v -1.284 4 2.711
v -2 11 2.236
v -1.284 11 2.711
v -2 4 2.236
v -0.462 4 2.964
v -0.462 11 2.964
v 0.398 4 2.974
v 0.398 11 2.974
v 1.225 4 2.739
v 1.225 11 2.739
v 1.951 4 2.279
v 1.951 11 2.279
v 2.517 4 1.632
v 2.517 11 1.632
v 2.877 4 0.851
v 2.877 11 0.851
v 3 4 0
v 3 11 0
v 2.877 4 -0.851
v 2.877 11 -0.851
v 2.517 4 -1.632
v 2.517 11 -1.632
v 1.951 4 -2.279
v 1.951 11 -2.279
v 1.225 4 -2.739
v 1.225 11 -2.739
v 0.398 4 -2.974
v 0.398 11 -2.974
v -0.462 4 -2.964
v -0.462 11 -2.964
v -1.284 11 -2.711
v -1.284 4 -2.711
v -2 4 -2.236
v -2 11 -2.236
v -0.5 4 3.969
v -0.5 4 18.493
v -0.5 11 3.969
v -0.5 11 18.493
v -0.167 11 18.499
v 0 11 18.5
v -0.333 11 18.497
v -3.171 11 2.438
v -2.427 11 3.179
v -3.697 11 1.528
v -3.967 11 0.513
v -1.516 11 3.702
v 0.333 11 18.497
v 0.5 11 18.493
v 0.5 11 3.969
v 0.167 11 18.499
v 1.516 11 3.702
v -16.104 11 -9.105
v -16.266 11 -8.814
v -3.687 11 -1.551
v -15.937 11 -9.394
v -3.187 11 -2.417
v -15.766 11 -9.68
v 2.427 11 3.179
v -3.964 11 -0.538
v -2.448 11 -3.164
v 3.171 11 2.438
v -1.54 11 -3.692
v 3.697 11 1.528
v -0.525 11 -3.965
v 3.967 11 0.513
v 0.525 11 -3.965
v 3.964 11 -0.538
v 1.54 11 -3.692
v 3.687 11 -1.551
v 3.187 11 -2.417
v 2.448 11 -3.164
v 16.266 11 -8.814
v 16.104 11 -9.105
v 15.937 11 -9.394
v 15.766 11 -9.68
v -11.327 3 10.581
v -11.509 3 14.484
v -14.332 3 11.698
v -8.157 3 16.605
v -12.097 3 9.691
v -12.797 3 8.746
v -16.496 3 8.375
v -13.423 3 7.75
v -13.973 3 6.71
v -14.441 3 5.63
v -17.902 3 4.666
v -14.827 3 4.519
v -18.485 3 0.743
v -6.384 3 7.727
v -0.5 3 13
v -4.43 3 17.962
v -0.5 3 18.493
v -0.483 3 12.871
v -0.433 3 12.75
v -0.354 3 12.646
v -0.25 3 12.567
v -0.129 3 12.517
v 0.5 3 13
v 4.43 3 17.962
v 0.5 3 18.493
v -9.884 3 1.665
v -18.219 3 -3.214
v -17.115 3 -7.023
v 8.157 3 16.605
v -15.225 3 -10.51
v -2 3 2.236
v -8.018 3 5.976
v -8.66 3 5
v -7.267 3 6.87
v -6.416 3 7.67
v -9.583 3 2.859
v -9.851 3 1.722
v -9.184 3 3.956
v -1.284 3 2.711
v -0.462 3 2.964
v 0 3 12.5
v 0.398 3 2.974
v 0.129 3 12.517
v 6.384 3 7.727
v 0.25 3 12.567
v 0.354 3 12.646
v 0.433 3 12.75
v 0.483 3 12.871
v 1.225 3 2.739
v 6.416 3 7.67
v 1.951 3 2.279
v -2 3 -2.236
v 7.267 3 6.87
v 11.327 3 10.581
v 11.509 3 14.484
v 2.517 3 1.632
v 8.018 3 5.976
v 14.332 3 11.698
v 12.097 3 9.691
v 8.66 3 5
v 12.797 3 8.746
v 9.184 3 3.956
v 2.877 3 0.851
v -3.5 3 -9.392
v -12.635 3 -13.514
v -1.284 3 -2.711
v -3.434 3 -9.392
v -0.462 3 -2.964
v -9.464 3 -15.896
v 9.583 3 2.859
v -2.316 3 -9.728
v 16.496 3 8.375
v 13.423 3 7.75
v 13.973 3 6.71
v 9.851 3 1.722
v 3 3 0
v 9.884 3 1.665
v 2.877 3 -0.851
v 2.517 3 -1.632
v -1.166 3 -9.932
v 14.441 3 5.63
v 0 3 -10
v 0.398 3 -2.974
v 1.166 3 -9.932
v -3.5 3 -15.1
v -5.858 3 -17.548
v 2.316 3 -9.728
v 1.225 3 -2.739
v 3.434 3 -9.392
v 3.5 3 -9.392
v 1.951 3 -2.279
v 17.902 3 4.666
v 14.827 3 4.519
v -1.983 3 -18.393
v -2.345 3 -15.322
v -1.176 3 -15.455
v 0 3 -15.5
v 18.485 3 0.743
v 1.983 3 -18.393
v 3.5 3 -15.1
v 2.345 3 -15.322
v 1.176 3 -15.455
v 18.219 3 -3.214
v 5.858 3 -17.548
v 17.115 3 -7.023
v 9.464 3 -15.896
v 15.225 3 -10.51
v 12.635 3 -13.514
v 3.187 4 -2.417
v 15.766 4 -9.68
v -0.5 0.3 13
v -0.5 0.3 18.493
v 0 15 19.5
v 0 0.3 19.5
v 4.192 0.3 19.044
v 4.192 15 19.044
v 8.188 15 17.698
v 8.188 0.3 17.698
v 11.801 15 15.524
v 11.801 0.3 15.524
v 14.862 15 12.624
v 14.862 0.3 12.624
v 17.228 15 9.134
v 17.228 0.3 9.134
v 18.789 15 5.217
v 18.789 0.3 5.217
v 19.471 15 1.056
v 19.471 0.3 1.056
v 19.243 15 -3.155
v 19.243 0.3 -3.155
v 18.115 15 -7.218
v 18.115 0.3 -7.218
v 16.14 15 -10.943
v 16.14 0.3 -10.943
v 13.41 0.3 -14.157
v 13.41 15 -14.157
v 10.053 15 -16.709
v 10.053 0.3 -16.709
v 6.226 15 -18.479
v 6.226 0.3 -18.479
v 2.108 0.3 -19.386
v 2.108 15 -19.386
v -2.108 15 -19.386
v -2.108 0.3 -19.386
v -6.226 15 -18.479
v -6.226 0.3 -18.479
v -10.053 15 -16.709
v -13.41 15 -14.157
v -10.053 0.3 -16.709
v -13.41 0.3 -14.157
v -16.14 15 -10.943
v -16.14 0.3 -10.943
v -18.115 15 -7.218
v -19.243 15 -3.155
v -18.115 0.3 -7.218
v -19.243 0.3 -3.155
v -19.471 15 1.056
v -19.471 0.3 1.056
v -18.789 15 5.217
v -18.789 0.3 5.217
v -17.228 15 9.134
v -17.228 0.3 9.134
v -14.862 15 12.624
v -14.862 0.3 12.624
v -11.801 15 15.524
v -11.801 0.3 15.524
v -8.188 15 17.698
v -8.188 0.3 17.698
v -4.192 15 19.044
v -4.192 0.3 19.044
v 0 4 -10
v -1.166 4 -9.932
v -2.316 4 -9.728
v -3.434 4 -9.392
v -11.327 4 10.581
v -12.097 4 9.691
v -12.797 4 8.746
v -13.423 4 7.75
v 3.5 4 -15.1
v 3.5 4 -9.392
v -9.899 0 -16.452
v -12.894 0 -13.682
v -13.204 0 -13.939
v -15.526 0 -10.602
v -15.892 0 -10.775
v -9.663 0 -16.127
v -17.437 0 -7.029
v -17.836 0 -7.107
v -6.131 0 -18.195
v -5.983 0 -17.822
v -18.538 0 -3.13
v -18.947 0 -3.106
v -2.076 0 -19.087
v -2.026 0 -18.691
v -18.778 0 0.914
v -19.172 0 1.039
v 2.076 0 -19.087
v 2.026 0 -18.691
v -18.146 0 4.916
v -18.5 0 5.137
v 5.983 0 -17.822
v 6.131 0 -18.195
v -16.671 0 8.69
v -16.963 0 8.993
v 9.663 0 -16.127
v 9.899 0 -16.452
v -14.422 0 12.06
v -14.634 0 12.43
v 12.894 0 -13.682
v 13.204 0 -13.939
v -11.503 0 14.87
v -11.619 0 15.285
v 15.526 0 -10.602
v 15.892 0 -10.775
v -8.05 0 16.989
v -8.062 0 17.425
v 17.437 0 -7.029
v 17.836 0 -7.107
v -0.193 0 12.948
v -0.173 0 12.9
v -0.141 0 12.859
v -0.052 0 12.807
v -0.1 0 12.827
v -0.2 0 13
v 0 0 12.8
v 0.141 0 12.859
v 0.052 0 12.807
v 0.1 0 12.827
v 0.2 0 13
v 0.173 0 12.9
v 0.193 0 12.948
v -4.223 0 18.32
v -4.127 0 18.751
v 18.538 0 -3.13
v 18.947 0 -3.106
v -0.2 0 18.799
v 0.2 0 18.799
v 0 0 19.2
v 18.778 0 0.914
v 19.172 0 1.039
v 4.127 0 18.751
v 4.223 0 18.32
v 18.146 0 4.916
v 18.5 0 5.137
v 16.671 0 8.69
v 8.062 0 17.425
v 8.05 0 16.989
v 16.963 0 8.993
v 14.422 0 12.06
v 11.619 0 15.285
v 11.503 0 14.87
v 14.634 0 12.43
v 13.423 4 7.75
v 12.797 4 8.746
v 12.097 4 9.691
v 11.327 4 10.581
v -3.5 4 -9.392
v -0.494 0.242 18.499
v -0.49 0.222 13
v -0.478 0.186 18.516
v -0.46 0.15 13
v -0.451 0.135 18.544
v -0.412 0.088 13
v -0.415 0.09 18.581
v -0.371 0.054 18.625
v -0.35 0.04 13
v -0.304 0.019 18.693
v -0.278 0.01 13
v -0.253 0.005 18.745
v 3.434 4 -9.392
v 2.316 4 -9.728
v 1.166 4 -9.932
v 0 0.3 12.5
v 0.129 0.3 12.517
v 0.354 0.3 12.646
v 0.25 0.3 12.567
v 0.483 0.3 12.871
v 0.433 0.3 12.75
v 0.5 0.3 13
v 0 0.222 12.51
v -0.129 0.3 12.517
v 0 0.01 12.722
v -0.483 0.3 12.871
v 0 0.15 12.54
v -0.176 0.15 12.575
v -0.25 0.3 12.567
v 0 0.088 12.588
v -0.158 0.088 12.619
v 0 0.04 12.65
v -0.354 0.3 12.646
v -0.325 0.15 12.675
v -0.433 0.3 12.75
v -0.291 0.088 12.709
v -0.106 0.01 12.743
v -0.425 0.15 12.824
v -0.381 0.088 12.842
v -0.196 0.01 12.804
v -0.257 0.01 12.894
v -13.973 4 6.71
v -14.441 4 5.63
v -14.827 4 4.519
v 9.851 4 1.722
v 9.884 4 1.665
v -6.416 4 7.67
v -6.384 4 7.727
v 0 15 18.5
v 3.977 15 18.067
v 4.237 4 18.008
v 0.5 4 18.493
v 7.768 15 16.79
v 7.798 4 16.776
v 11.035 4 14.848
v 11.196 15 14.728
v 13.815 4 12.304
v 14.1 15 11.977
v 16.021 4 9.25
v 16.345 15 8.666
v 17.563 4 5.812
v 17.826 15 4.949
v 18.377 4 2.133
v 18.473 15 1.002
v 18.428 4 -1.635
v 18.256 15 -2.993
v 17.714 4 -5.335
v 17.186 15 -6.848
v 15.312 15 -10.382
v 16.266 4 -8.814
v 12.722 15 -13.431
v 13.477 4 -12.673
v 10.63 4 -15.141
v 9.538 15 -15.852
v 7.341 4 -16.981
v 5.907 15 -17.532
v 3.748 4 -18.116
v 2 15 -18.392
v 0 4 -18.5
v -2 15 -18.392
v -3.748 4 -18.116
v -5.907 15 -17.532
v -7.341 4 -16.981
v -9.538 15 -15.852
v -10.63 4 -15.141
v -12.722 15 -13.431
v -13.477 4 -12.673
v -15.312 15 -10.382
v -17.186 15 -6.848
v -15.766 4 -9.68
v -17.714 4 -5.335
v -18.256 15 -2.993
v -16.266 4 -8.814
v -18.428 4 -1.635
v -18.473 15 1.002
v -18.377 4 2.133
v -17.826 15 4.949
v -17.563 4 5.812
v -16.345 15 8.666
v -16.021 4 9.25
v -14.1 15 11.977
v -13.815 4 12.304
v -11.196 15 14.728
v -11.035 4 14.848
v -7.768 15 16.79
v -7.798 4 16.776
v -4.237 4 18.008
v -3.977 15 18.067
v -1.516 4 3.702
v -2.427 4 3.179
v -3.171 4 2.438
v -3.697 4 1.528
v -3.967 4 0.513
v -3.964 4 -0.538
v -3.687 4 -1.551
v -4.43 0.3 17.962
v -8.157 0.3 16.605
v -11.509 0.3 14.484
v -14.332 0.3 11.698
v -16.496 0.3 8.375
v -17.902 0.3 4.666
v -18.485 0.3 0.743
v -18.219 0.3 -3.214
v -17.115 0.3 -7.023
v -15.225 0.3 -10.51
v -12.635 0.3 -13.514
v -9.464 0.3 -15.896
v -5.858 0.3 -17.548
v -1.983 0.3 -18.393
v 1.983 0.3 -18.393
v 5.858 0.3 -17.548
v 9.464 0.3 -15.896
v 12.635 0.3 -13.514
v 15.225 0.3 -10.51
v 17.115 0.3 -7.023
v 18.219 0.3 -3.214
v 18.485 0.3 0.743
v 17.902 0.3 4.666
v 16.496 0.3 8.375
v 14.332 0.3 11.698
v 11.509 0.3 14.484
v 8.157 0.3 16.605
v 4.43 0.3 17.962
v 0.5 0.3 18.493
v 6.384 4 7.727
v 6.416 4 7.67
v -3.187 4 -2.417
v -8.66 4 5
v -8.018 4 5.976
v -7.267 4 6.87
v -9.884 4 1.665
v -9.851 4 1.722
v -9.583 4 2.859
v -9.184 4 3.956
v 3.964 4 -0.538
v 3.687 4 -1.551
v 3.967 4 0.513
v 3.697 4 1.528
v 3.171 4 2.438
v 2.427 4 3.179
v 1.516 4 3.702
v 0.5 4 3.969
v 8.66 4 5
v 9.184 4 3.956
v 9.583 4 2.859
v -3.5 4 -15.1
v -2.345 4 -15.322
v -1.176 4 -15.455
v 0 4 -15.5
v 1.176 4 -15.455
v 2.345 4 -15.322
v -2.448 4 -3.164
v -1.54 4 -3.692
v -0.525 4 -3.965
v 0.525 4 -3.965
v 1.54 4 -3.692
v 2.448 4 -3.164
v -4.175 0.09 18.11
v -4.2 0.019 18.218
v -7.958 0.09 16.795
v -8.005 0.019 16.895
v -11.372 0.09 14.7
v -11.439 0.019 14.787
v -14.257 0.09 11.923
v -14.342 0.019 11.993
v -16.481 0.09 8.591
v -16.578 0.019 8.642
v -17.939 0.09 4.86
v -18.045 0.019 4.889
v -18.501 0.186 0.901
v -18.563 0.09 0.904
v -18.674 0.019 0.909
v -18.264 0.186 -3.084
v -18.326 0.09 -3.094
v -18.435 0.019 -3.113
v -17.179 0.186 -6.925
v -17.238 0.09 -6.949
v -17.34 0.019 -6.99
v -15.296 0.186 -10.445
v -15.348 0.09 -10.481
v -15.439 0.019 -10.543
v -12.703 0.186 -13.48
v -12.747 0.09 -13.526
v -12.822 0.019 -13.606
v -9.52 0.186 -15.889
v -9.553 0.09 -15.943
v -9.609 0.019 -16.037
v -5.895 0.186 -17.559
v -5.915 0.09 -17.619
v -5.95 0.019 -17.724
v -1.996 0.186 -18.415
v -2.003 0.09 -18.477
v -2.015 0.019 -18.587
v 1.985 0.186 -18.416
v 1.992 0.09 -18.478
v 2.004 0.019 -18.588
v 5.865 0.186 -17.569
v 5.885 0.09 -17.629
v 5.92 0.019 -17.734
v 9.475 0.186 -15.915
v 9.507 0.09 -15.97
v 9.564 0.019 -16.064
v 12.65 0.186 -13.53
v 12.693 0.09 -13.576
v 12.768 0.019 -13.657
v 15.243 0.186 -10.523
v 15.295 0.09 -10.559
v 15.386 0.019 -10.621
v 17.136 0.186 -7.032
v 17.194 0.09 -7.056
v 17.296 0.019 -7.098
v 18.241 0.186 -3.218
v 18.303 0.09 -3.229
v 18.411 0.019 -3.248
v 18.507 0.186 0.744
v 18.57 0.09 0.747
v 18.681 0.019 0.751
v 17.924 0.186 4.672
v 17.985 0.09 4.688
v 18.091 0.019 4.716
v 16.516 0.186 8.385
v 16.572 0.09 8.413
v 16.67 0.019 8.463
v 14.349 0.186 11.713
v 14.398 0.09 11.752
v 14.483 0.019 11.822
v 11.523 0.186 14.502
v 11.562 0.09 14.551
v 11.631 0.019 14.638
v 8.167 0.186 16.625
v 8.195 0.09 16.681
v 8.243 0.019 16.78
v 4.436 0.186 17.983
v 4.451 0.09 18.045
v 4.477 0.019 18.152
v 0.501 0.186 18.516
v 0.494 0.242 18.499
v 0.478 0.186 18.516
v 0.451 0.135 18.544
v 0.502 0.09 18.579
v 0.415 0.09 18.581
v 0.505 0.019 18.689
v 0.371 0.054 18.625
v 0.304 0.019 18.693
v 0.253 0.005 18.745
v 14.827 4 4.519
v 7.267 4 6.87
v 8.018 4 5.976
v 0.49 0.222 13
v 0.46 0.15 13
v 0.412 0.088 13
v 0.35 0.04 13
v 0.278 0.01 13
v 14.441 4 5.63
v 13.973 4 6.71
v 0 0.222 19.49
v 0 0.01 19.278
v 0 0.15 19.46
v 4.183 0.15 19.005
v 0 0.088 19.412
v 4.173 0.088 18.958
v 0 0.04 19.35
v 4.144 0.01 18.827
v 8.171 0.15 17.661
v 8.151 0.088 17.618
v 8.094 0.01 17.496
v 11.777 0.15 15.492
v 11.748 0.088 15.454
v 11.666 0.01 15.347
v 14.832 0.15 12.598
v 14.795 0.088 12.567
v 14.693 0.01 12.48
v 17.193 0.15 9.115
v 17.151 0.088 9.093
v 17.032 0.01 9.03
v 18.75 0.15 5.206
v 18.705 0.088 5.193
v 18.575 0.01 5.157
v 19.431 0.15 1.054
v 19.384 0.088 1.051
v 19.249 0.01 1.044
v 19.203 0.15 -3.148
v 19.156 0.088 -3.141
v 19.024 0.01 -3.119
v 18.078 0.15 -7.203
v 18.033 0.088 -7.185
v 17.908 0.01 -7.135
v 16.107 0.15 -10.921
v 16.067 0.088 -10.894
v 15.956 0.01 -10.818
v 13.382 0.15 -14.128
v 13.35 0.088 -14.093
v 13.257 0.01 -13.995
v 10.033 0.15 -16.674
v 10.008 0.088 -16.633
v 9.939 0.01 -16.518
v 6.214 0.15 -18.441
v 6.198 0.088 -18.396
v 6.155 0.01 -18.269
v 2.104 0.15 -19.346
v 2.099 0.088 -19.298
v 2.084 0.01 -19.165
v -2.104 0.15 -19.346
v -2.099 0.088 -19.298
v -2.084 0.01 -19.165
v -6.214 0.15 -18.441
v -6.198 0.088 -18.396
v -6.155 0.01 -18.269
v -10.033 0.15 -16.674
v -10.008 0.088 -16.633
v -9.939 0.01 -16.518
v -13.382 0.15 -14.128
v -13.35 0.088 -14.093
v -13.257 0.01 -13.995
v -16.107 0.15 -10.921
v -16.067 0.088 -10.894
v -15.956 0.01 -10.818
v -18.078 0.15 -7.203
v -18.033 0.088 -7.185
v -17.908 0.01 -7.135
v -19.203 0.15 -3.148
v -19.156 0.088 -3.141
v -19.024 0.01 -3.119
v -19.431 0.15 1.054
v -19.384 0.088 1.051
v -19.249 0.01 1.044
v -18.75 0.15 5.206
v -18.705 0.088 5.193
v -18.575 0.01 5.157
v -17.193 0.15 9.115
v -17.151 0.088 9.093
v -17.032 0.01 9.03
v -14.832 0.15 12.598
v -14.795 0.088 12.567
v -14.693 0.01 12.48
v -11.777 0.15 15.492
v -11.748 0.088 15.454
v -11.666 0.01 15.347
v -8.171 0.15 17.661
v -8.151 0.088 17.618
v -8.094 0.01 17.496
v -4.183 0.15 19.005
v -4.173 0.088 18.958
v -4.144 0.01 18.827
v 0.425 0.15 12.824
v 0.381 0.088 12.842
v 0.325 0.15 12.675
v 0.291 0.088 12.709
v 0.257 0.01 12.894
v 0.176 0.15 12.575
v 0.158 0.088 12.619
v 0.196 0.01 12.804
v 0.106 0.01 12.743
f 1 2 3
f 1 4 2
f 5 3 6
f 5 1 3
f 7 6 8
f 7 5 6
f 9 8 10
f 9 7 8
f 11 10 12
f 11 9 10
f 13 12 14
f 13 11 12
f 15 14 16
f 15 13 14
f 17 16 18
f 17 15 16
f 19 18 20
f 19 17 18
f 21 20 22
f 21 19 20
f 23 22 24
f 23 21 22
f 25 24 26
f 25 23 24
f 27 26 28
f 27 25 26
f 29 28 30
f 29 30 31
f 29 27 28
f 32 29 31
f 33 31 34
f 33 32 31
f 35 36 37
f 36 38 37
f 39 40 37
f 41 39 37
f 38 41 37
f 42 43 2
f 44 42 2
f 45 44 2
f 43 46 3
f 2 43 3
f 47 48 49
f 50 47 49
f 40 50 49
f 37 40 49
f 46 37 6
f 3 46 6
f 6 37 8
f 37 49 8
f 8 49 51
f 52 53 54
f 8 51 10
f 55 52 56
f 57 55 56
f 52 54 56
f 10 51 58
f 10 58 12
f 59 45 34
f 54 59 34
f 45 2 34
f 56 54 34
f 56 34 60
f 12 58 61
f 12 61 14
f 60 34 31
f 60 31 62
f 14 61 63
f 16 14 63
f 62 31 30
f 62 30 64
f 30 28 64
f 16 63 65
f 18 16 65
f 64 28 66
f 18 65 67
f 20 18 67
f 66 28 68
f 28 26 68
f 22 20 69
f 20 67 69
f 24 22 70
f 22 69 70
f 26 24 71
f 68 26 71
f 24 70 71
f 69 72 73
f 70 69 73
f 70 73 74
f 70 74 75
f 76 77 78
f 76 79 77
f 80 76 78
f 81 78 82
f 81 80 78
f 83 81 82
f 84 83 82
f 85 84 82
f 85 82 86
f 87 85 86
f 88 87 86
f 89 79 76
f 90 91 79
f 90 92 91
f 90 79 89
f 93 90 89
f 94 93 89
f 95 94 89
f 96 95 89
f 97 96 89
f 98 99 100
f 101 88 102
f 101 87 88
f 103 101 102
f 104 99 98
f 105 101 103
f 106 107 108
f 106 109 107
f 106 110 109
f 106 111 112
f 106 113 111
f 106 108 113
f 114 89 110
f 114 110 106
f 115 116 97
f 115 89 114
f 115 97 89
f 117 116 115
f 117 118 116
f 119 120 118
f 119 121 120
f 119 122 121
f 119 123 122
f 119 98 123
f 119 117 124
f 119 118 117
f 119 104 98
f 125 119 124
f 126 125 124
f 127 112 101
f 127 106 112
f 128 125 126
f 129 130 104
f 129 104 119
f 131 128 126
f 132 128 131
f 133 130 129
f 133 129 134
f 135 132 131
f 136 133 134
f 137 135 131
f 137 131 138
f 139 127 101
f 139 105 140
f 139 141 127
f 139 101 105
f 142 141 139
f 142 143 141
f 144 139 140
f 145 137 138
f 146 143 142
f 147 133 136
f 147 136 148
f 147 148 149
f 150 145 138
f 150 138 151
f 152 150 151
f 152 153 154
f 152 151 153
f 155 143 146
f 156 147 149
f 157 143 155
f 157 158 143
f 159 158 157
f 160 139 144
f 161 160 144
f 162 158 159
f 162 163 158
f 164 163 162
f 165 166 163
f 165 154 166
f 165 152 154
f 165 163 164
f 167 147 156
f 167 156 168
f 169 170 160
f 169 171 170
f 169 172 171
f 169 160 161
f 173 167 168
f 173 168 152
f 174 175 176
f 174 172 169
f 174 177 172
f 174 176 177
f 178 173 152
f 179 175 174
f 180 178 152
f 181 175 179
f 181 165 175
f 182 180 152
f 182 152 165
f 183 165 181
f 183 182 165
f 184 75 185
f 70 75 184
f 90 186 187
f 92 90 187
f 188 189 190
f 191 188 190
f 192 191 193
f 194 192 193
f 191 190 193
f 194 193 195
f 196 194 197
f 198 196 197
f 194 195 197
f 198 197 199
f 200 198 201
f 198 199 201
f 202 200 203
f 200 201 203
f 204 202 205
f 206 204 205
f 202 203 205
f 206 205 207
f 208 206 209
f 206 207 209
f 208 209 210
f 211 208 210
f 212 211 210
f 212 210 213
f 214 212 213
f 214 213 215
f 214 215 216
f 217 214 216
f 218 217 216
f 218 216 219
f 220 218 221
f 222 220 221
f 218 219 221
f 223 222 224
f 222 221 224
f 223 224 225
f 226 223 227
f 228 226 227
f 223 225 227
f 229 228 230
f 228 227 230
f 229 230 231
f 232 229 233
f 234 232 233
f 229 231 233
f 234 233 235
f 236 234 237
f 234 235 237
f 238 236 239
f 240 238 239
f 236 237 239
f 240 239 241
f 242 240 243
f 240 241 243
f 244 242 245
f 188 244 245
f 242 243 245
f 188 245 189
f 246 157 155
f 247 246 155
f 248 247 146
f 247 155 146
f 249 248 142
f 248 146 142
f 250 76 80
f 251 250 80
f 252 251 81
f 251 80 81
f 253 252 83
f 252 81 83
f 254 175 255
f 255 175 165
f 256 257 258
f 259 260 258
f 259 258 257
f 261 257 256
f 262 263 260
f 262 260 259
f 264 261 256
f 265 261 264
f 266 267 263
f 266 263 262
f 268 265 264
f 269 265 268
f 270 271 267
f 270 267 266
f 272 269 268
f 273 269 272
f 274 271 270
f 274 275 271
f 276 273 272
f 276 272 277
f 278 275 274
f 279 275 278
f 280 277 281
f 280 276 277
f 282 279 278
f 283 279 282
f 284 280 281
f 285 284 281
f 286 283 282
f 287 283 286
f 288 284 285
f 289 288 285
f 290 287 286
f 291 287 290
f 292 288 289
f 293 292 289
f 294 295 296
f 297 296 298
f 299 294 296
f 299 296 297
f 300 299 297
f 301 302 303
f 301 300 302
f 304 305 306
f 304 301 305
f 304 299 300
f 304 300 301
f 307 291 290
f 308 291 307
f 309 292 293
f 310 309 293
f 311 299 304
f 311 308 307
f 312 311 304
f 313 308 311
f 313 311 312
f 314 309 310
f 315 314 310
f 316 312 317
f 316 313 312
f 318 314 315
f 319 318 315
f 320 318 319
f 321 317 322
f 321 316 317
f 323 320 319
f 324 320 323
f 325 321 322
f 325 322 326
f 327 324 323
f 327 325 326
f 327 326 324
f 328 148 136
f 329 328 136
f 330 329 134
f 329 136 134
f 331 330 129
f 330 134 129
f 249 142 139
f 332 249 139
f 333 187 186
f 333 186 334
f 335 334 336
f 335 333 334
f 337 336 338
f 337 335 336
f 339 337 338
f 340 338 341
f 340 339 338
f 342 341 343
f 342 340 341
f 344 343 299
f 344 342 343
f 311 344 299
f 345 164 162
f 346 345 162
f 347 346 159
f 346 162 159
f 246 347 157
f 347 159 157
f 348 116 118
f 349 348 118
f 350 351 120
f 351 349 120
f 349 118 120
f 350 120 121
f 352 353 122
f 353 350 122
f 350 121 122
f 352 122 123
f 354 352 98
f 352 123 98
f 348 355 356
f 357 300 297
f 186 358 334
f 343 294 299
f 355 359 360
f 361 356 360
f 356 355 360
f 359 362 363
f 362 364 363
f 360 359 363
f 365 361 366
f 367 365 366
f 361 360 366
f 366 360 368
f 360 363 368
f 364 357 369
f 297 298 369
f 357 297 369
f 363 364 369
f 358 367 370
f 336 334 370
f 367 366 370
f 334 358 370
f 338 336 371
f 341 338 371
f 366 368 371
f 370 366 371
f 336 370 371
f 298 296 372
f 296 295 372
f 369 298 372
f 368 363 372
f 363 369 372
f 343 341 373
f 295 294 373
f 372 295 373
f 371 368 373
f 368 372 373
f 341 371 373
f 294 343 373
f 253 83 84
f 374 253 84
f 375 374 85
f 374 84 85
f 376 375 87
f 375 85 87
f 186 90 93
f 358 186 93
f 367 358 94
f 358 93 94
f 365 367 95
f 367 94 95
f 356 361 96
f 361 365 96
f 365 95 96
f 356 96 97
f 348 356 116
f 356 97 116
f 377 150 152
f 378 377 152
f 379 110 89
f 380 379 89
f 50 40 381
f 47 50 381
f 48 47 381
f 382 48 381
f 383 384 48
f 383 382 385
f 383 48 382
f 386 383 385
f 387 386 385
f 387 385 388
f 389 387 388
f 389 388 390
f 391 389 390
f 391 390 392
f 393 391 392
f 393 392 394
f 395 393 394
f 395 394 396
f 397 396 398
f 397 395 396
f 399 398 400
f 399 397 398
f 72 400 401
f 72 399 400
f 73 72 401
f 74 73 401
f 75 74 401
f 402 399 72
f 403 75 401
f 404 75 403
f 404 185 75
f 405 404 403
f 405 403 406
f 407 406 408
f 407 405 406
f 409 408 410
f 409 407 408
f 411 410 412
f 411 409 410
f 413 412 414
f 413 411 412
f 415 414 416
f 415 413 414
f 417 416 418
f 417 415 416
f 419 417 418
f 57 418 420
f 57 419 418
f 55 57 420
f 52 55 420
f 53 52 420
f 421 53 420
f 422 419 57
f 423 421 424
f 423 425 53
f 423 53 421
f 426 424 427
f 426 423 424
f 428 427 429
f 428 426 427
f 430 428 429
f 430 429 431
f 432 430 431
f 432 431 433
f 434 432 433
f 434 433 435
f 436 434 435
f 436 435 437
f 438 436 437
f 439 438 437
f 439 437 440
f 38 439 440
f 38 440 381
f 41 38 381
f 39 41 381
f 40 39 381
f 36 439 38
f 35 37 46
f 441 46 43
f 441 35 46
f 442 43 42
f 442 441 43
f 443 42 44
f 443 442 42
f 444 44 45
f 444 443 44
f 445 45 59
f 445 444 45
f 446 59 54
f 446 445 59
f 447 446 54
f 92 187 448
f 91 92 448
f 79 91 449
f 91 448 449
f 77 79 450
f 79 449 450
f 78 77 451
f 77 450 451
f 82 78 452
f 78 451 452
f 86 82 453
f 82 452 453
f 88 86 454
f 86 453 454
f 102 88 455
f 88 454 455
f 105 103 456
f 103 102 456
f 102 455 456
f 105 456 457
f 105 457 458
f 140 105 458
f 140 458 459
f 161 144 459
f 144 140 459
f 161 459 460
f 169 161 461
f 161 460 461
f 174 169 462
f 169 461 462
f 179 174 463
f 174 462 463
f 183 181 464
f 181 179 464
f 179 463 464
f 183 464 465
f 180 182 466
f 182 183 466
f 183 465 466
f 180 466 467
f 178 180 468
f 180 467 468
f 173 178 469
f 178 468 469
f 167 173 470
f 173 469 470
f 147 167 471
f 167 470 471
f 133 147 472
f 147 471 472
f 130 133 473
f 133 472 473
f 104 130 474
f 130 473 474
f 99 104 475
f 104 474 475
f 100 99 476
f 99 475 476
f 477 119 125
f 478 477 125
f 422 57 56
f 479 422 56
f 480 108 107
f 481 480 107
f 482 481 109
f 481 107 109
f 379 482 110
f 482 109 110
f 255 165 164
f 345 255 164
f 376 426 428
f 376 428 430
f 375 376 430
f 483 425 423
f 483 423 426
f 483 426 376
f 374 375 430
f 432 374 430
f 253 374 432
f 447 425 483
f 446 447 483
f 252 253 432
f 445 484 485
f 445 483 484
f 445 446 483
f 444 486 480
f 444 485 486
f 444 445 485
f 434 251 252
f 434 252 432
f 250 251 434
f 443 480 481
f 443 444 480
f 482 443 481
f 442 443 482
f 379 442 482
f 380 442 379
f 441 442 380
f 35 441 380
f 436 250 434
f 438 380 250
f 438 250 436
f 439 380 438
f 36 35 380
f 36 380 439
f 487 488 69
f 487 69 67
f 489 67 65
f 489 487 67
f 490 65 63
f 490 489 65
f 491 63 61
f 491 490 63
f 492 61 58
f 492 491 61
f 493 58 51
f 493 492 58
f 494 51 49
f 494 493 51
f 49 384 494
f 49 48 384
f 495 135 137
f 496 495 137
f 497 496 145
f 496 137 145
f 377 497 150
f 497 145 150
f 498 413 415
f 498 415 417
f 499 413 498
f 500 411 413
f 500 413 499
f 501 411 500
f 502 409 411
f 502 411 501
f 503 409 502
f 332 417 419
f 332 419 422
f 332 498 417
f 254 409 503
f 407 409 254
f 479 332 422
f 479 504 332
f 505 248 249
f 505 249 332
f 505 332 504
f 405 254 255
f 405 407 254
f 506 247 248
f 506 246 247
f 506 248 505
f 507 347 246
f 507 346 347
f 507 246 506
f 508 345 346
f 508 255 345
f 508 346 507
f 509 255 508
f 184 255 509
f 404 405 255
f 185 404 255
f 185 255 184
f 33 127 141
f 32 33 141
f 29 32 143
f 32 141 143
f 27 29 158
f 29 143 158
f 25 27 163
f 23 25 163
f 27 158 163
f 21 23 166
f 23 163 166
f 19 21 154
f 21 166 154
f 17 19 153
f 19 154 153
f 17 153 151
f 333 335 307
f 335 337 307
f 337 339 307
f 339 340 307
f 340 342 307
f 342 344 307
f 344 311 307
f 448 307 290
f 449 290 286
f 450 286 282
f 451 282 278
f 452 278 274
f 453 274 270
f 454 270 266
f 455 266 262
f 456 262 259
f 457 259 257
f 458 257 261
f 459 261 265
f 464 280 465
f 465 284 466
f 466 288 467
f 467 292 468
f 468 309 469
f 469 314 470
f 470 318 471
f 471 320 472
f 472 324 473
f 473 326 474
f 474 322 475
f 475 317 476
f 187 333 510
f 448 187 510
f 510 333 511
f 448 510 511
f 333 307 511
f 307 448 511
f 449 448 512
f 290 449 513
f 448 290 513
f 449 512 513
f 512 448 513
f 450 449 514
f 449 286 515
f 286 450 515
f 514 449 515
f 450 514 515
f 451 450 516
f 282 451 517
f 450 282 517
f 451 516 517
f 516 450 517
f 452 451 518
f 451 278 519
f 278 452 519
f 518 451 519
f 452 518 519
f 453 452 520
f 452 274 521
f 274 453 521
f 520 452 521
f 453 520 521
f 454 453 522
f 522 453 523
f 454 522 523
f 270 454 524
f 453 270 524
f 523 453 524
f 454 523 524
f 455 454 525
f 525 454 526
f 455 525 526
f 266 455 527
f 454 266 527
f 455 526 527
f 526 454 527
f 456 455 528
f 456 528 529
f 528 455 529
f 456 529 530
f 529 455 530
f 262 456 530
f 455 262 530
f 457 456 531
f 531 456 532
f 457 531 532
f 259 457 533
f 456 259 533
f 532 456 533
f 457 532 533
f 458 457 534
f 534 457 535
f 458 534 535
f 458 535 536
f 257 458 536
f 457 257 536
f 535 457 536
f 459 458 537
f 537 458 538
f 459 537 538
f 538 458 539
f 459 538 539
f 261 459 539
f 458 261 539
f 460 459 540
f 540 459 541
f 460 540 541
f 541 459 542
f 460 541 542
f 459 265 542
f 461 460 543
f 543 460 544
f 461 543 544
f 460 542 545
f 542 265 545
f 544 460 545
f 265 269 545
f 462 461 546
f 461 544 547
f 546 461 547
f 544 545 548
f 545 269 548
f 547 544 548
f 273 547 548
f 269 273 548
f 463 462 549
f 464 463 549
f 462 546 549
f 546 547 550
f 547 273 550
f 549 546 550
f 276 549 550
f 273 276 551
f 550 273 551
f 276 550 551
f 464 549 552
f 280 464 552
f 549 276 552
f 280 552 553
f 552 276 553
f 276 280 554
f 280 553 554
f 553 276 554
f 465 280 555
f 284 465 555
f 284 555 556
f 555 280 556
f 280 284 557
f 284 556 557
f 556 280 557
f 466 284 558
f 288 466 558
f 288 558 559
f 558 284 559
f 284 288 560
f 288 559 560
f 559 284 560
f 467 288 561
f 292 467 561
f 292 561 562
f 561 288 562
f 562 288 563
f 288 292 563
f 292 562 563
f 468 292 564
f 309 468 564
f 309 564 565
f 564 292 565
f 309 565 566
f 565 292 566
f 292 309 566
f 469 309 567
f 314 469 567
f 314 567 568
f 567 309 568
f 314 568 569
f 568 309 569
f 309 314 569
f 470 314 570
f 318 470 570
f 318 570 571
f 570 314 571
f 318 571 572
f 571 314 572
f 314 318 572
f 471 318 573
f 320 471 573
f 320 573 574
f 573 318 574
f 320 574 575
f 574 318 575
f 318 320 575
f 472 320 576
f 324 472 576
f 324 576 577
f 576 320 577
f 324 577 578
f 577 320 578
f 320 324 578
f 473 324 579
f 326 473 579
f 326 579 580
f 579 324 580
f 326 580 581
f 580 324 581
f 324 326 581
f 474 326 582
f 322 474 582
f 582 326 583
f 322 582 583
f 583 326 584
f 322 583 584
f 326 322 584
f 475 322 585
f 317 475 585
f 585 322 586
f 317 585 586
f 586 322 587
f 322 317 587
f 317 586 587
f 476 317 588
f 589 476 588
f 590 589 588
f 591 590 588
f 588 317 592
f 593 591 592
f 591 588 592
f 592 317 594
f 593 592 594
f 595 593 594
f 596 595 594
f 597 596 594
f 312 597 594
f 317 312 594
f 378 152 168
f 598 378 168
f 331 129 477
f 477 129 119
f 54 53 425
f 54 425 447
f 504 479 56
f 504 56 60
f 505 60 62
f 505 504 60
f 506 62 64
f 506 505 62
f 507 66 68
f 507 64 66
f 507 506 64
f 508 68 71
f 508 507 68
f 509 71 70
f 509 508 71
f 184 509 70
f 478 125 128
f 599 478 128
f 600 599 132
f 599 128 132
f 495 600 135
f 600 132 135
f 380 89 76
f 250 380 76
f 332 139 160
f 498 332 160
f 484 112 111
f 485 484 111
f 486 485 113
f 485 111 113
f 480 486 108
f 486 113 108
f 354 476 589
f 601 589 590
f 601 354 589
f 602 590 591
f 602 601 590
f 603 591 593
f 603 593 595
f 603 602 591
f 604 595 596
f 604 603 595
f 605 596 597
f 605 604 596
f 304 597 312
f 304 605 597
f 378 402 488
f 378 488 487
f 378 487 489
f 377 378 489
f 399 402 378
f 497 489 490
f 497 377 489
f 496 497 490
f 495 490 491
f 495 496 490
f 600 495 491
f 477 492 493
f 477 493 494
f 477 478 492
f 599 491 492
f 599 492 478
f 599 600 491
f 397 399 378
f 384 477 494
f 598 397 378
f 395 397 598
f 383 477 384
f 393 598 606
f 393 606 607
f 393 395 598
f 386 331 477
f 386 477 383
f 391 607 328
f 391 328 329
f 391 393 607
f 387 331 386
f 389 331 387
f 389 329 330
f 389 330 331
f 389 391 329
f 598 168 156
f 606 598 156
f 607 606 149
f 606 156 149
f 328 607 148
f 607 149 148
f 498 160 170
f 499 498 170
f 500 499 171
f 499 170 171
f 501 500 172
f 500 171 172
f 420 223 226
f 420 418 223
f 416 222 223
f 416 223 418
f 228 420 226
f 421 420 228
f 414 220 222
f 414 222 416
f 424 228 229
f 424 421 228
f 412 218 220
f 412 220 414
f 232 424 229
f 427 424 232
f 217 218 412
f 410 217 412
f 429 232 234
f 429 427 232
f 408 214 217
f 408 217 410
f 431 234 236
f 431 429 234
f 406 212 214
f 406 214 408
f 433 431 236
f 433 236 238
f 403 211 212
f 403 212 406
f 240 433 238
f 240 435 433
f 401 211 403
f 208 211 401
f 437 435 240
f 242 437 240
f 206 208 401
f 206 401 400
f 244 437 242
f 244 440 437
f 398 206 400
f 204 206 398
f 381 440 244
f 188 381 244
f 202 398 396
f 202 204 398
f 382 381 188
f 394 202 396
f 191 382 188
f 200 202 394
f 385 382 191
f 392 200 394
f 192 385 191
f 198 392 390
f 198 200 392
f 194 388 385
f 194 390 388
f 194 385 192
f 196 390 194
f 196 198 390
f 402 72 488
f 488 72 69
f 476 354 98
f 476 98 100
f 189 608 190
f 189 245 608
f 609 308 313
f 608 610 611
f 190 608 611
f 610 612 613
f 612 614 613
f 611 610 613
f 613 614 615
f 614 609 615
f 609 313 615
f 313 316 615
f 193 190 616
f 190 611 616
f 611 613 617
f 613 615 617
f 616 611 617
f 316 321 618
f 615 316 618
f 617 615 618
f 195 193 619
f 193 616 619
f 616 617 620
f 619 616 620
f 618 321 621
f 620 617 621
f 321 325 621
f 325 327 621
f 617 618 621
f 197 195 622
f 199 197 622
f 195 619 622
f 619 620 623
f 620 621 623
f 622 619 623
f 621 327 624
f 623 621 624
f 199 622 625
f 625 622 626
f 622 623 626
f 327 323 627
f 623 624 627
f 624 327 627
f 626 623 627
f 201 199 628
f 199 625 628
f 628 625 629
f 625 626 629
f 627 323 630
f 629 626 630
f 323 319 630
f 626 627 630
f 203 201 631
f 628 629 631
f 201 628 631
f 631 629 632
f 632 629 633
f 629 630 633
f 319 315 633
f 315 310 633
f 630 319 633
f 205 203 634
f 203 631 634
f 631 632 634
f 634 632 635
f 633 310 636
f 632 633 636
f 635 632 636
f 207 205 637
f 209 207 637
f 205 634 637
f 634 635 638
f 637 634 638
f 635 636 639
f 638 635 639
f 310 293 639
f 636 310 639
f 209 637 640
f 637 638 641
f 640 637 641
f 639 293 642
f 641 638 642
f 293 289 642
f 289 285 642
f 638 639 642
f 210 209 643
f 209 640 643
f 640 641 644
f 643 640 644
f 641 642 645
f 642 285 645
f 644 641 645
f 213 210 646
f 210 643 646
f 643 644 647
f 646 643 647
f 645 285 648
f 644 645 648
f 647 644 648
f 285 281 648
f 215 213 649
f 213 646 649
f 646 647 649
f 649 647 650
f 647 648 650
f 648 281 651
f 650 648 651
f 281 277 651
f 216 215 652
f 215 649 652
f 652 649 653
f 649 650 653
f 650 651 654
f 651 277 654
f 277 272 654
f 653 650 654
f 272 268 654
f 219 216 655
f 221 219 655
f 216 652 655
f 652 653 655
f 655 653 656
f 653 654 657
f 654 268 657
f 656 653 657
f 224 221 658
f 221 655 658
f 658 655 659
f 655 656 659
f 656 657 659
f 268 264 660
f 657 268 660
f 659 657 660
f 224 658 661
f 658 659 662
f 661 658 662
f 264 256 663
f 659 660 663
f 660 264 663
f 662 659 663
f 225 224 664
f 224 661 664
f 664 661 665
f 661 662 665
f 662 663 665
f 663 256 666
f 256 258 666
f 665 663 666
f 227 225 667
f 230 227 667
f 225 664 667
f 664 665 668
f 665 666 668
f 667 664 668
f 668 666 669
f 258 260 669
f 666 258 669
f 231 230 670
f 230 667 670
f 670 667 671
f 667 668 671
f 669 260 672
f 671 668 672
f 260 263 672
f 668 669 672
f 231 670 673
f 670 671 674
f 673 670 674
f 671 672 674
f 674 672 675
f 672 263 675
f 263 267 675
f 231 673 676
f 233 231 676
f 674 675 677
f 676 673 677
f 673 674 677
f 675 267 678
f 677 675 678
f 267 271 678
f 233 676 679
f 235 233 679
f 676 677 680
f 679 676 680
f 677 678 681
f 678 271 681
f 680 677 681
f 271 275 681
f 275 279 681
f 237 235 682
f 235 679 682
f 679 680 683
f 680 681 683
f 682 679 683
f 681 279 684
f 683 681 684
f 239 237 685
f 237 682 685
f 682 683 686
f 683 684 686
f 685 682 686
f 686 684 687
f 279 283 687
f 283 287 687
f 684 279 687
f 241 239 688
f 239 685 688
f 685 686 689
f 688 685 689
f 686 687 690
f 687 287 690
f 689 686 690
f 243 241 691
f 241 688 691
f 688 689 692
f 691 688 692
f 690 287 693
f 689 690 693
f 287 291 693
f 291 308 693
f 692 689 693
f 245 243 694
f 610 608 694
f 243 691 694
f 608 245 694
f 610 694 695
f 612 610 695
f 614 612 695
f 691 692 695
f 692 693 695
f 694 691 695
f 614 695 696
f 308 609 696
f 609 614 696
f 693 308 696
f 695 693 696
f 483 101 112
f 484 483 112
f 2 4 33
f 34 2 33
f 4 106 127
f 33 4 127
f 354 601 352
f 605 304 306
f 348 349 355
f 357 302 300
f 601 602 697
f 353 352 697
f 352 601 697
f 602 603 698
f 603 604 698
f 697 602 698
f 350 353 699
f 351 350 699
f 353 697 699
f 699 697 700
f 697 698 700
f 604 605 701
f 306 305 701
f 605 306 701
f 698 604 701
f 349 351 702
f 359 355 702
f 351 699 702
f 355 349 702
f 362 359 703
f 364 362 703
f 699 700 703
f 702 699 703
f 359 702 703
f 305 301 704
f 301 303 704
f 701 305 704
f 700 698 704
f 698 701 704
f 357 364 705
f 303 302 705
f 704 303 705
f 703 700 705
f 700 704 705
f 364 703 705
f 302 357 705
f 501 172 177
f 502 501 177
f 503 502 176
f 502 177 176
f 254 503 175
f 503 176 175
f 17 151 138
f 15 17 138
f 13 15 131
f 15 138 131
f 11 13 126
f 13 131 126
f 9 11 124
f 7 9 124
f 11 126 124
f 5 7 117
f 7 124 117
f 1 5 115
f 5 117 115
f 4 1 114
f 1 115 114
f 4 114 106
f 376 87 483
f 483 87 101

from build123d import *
from build123d.topology import SkipClean

# Parameters (mm, degrees)
SKETCH1_R            = 19.5
SKETCH1_R_2          = 18.5
BOSS_EXTRUDE1_DEPTH  = 15
SKETCH2_R            = 18.5
BOSS_EXTRUDE2_DEPTH  = 4
SKETCH3_R            = 18.5
CUT_EXTRUDE1_DEPTH   = 3
CUT_EXTRUDE2_DEPTH   = 3
CIRPATTERN1_COUNT    = 3
SKETCH8_R            = 4
BOSS_EXTRUDE28_DEPTH = 8
CUT_EXTRUDE3_DEPTH   = 8
SKETCH11_W           = 1
SKETCH11_H           = 15.24098
BOSS_EXTRUDE29_DEPTH = 8
CIRPATTERN5_COUNT    = 3
SKETCH12_W           = 1
SKETCH12_H           = 6.224425
BOSS_EXTRUDE30_DEPTH = 8
FILLET7_R            = 0.5
FILLET8_R            = 0.3


with BuildPart() as part:
    # Sketch1 → Boss-Extrude1 (new body)
    with BuildSketch(Plane(origin=(0, 0, 0), x_dir=(1, 0, 0), z_dir=(0, 1, 0))):
        with Locations(Location((0, 0, 0), (0, 0, 270))):
            Circle(SKETCH1_R)
        with Locations(Location((0, 0, 0), (0, 0, 270))):
            Circle(SKETCH1_R_2, mode=Mode.SUBTRACT)
    extrude(amount=BOSS_EXTRUDE1_DEPTH)

    # Sketch2 → Boss-Extrude2 (add)
    with BuildSketch(Plane(origin=(0, 0, 0), x_dir=(1, 0, 0), z_dir=(0, 1, 0))):
        with Locations(Location((0, 0, 0), (0, 0, 270))):
            Circle(SKETCH2_R)
    extrude(amount=BOSS_EXTRUDE2_DEPTH)

    # Sketch3 → Cut-Extrude1 (cut)
    with BuildSketch(Plane(origin=(0, 0, 0), x_dir=(-1, 0, 0), z_dir=(0, -1, 0))):
        with Locations(Location((0, 0, 0), (0, 0, 270))):
            Circle(SKETCH3_R)
    extrude(amount=-CUT_EXTRUDE1_DEPTH, mode=Mode.SUBTRACT)

    # Sketch6 → Cut-Extrude2 (cut)
    with BuildSketch(Plane(origin=(0, 3, 0), x_dir=(-1, 0, 0), z_dir=(0, -1, 0))):
        with BuildLine():
            ThreePointArc((-3.434212, 9.391815), (-1.743825, 9.84678), (0, 10))
            Line((0, 10), (0, 15.5))
            ThreePointArc((0, 15.5), (-1.76141, 15.399592), (-3.5, 15.099669))
            Line((-3.5, 15.099669), (-3.5, 9.391815))
            Line((-3.5, 9.391815), (-3.434212, 9.391815))
        make_face()
        with BuildLine():
            Line((0, 15.5), (0, 10))
            ThreePointArc((0, 10), (1.743825, 9.84678), (3.434212, 9.391815))
            Line((3.434212, 9.391815), (3.5, 9.391815))
            Line((3.5, 9.391815), (3.5, 15.099669))
            ThreePointArc((3.5, 15.099669), (1.76141, 15.399592), (0, 15.5))
        make_face()
    cut_extrude2 = extrude(amount=-CUT_EXTRUDE2_DEPTH, mode=Mode.SUBTRACT)

    # CirPattern1: Cut-Extrude2 ×3 about axis
    cirpattern1_axis = Axis((0, 0, 0), (0, 1, 0))
    for i in range(1, CIRPATTERN1_COUNT):
        add(cut_extrude2.rotate(cirpattern1_axis, i * 360 / CIRPATTERN1_COUNT), mode=Mode.SUBTRACT)

    # Sketch8 → Boss-Extrude28 (add)
    with BuildSketch(Plane.XZ.offset(-3)):
        with Locations(Location((0, 0, 0), (0, 0, 270))):
            Circle(SKETCH8_R)
        with BuildLine():
            Line((-2, -2.236068), (-2, 2.236068))
            ThreePointArc((-2, 2.236068), (3, 0), (-2, -2.236068))
        make_face(mode=Mode.SUBTRACT)
    extrude(amount=-BOSS_EXTRUDE28_DEPTH)

    # Sketch8<3> → Cut-Extrude3 (cut)
    with SkipClean():  # the faces are left unmerged after this step: merging them gives an invalid solid
        with BuildSketch(Plane.XZ.offset(-3)):
            with BuildLine():
                ThreePointArc((3, 0), (1.224745, 2.738613), (-2, 2.236068))
                Line((-2, 2.236068), (-2, -2.236068))
                ThreePointArc((-2, -2.236068), (1.224745, -2.738613), (3, 0))
            make_face()
        extrude(amount=-CUT_EXTRUDE3_DEPTH, mode=Mode.SUBTRACT)

    # Sketch11 → Boss-Extrude29 (add)
    with SkipClean():  # the faces are left unmerged after this step: merging them gives an invalid solid
        with BuildSketch(Plane(origin=(0, 11, 0), x_dir=(1, 0, 0), z_dir=(0, 1, 0))):
            with Locations((0, -11.25)):
                Rectangle(SKETCH11_W, SKETCH11_H)
        boss_extrude29 = extrude(amount=-BOSS_EXTRUDE29_DEPTH)

    # CirPattern5: Boss-Extrude29 ×3 about axis
    with SkipClean():  # the faces are left unmerged after this step: merging them gives an invalid solid
        cirpattern5_axis = Axis((0, 0, 0), (0, 1, 0))
        for i in range(1, CIRPATTERN5_COUNT):
            add(boss_extrude29.rotate(cirpattern5_axis, i * 360 / CIRPATTERN5_COUNT))

    # Sketch12 → Boss-Extrude30 (add)
    with SkipClean():  # the faces are left unmerged after this step: merging them gives an invalid solid
        with BuildSketch(Plane.XZ):
            with Locations((0, 15.612213)):
                Rectangle(SKETCH12_W, SKETCH12_H)
        extrude(amount=-BOSS_EXTRUDE30_DEPTH)

    # Fillet7
    fillet7_edges = [part.edges().sort_by_distance(p)[0] for p in [
        (-0.5, 1.5, 12.5),
        (0.5, 1.5, 12.5),
    ]]
    fillet(fillet7_edges, radius=FILLET7_R - 0.0001)  # a hair under: the kernel refuses the full size

    # Fillet8
    fillet8_edges = [part.edges().sort_by_distance(p)[0] for p in [
        (0, 0, -19.5),
        (0, 0, -18.5),
        (-0.5, 0, 15.746571),
        (0.5, 0, 15.746571),
        (0.353583, 0, 12.646417),
        (-0.353583, 0, 12.646417),
    ]]
    fillet(fillet8_edges, radius=FILLET8_R)


solid = part.part
